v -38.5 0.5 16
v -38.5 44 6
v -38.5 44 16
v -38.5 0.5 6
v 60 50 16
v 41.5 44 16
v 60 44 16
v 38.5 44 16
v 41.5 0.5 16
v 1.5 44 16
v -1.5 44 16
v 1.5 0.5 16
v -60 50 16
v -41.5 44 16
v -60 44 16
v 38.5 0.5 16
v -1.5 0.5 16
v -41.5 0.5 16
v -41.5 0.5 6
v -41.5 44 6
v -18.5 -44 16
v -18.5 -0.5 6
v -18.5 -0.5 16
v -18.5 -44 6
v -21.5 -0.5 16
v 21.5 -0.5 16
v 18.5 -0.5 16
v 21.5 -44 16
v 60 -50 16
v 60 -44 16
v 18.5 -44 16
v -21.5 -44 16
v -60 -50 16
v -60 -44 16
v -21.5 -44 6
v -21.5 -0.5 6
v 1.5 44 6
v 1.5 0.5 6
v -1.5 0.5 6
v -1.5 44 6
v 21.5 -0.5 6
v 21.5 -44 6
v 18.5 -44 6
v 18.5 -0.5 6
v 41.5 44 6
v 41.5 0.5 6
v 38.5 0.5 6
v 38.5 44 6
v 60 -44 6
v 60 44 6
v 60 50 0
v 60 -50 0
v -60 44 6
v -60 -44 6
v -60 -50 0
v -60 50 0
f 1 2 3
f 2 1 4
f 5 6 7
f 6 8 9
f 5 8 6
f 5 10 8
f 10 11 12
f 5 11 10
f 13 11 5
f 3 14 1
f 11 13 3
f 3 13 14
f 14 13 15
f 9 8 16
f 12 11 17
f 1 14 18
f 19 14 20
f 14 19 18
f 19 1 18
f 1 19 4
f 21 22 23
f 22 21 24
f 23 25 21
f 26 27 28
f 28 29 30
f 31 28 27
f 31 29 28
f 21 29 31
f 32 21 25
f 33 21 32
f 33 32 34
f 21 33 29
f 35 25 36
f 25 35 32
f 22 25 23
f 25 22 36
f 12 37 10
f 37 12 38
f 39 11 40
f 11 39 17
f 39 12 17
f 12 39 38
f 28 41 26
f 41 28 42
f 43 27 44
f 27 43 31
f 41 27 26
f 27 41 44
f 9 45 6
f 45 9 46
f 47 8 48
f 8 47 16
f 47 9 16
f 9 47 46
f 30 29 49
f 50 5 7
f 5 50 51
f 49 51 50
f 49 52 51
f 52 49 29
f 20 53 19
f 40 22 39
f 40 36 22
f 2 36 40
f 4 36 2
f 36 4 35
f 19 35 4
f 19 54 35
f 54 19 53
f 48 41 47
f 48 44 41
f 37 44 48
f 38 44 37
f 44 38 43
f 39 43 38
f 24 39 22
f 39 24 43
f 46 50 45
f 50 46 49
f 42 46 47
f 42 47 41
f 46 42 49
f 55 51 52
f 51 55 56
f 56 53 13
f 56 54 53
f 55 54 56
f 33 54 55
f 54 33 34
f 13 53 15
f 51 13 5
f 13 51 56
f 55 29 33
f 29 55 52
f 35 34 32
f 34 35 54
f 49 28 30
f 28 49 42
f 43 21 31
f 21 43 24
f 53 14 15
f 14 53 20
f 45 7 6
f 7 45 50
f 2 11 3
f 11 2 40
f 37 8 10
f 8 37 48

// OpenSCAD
$fn = 32;

// ----------------------------------------------------------------------
// Rib frame 120 x 100 x 16
// 5 ribs at 20 mm pitch, staggered
// ----------------------------------------------------------------------

// --- parameters (mm) ---
frame = [120, 100, 6];  // base plate size (x, y, z)
rail_w = 6;             // side rail width
ribs = 5;               // number of ribs
rib_t = 3;              // rib thickness
rib_h = 10;             // rib height above the base plate
pitch = 20;             // pitch between rib centres

// --- derived feature positions (mm) ---
span = (ribs - 1) * pitch;          // = 80   distance between the outer ribs
origin_x = -span / 2;               // = -40   X of the first rib
rib_len = frame[1] / 2 - rail_w + 0.5;  // = 44.5   length of a staggered rib
rib_y = 0.5 + rib_len / 2;          // = 22.75   Y of a staggered rib centre
row_offset = 2 * rib_y;             // = 45.5   distance between the two rows
feature_centers = [
  [origin_x + 0 * pitch, rib_y],
  [origin_x + 1 * pitch, -rib_y],
  [origin_x + 2 * pitch, rib_y],
  [origin_x + 3 * pitch, -rib_y],
  [origin_x + 4 * pitch, rib_y]
];   // rib centre line, drives the rib loop

// base plate, two side rails, then the ribs read straight off feature_centers
union() {
  translate([-frame[0] / 2, -frame[1] / 2, 0]) cube(frame);
  translate([-frame[0] / 2, -frame[1] / 2, 0]) cube([frame[0], rail_w, frame[2] + rib_h]);
  translate([-frame[0] / 2, frame[1] / 2 - rail_w, 0]) cube([frame[0], rail_w, frame[2] + rib_h]);
  for (centre = feature_centers)
    translate([centre[0] - rib_t / 2, centre[1] - rib_len / 2, frame[2] - 1])
      cube([rib_t, rib_len, rib_h + 1]);
}
